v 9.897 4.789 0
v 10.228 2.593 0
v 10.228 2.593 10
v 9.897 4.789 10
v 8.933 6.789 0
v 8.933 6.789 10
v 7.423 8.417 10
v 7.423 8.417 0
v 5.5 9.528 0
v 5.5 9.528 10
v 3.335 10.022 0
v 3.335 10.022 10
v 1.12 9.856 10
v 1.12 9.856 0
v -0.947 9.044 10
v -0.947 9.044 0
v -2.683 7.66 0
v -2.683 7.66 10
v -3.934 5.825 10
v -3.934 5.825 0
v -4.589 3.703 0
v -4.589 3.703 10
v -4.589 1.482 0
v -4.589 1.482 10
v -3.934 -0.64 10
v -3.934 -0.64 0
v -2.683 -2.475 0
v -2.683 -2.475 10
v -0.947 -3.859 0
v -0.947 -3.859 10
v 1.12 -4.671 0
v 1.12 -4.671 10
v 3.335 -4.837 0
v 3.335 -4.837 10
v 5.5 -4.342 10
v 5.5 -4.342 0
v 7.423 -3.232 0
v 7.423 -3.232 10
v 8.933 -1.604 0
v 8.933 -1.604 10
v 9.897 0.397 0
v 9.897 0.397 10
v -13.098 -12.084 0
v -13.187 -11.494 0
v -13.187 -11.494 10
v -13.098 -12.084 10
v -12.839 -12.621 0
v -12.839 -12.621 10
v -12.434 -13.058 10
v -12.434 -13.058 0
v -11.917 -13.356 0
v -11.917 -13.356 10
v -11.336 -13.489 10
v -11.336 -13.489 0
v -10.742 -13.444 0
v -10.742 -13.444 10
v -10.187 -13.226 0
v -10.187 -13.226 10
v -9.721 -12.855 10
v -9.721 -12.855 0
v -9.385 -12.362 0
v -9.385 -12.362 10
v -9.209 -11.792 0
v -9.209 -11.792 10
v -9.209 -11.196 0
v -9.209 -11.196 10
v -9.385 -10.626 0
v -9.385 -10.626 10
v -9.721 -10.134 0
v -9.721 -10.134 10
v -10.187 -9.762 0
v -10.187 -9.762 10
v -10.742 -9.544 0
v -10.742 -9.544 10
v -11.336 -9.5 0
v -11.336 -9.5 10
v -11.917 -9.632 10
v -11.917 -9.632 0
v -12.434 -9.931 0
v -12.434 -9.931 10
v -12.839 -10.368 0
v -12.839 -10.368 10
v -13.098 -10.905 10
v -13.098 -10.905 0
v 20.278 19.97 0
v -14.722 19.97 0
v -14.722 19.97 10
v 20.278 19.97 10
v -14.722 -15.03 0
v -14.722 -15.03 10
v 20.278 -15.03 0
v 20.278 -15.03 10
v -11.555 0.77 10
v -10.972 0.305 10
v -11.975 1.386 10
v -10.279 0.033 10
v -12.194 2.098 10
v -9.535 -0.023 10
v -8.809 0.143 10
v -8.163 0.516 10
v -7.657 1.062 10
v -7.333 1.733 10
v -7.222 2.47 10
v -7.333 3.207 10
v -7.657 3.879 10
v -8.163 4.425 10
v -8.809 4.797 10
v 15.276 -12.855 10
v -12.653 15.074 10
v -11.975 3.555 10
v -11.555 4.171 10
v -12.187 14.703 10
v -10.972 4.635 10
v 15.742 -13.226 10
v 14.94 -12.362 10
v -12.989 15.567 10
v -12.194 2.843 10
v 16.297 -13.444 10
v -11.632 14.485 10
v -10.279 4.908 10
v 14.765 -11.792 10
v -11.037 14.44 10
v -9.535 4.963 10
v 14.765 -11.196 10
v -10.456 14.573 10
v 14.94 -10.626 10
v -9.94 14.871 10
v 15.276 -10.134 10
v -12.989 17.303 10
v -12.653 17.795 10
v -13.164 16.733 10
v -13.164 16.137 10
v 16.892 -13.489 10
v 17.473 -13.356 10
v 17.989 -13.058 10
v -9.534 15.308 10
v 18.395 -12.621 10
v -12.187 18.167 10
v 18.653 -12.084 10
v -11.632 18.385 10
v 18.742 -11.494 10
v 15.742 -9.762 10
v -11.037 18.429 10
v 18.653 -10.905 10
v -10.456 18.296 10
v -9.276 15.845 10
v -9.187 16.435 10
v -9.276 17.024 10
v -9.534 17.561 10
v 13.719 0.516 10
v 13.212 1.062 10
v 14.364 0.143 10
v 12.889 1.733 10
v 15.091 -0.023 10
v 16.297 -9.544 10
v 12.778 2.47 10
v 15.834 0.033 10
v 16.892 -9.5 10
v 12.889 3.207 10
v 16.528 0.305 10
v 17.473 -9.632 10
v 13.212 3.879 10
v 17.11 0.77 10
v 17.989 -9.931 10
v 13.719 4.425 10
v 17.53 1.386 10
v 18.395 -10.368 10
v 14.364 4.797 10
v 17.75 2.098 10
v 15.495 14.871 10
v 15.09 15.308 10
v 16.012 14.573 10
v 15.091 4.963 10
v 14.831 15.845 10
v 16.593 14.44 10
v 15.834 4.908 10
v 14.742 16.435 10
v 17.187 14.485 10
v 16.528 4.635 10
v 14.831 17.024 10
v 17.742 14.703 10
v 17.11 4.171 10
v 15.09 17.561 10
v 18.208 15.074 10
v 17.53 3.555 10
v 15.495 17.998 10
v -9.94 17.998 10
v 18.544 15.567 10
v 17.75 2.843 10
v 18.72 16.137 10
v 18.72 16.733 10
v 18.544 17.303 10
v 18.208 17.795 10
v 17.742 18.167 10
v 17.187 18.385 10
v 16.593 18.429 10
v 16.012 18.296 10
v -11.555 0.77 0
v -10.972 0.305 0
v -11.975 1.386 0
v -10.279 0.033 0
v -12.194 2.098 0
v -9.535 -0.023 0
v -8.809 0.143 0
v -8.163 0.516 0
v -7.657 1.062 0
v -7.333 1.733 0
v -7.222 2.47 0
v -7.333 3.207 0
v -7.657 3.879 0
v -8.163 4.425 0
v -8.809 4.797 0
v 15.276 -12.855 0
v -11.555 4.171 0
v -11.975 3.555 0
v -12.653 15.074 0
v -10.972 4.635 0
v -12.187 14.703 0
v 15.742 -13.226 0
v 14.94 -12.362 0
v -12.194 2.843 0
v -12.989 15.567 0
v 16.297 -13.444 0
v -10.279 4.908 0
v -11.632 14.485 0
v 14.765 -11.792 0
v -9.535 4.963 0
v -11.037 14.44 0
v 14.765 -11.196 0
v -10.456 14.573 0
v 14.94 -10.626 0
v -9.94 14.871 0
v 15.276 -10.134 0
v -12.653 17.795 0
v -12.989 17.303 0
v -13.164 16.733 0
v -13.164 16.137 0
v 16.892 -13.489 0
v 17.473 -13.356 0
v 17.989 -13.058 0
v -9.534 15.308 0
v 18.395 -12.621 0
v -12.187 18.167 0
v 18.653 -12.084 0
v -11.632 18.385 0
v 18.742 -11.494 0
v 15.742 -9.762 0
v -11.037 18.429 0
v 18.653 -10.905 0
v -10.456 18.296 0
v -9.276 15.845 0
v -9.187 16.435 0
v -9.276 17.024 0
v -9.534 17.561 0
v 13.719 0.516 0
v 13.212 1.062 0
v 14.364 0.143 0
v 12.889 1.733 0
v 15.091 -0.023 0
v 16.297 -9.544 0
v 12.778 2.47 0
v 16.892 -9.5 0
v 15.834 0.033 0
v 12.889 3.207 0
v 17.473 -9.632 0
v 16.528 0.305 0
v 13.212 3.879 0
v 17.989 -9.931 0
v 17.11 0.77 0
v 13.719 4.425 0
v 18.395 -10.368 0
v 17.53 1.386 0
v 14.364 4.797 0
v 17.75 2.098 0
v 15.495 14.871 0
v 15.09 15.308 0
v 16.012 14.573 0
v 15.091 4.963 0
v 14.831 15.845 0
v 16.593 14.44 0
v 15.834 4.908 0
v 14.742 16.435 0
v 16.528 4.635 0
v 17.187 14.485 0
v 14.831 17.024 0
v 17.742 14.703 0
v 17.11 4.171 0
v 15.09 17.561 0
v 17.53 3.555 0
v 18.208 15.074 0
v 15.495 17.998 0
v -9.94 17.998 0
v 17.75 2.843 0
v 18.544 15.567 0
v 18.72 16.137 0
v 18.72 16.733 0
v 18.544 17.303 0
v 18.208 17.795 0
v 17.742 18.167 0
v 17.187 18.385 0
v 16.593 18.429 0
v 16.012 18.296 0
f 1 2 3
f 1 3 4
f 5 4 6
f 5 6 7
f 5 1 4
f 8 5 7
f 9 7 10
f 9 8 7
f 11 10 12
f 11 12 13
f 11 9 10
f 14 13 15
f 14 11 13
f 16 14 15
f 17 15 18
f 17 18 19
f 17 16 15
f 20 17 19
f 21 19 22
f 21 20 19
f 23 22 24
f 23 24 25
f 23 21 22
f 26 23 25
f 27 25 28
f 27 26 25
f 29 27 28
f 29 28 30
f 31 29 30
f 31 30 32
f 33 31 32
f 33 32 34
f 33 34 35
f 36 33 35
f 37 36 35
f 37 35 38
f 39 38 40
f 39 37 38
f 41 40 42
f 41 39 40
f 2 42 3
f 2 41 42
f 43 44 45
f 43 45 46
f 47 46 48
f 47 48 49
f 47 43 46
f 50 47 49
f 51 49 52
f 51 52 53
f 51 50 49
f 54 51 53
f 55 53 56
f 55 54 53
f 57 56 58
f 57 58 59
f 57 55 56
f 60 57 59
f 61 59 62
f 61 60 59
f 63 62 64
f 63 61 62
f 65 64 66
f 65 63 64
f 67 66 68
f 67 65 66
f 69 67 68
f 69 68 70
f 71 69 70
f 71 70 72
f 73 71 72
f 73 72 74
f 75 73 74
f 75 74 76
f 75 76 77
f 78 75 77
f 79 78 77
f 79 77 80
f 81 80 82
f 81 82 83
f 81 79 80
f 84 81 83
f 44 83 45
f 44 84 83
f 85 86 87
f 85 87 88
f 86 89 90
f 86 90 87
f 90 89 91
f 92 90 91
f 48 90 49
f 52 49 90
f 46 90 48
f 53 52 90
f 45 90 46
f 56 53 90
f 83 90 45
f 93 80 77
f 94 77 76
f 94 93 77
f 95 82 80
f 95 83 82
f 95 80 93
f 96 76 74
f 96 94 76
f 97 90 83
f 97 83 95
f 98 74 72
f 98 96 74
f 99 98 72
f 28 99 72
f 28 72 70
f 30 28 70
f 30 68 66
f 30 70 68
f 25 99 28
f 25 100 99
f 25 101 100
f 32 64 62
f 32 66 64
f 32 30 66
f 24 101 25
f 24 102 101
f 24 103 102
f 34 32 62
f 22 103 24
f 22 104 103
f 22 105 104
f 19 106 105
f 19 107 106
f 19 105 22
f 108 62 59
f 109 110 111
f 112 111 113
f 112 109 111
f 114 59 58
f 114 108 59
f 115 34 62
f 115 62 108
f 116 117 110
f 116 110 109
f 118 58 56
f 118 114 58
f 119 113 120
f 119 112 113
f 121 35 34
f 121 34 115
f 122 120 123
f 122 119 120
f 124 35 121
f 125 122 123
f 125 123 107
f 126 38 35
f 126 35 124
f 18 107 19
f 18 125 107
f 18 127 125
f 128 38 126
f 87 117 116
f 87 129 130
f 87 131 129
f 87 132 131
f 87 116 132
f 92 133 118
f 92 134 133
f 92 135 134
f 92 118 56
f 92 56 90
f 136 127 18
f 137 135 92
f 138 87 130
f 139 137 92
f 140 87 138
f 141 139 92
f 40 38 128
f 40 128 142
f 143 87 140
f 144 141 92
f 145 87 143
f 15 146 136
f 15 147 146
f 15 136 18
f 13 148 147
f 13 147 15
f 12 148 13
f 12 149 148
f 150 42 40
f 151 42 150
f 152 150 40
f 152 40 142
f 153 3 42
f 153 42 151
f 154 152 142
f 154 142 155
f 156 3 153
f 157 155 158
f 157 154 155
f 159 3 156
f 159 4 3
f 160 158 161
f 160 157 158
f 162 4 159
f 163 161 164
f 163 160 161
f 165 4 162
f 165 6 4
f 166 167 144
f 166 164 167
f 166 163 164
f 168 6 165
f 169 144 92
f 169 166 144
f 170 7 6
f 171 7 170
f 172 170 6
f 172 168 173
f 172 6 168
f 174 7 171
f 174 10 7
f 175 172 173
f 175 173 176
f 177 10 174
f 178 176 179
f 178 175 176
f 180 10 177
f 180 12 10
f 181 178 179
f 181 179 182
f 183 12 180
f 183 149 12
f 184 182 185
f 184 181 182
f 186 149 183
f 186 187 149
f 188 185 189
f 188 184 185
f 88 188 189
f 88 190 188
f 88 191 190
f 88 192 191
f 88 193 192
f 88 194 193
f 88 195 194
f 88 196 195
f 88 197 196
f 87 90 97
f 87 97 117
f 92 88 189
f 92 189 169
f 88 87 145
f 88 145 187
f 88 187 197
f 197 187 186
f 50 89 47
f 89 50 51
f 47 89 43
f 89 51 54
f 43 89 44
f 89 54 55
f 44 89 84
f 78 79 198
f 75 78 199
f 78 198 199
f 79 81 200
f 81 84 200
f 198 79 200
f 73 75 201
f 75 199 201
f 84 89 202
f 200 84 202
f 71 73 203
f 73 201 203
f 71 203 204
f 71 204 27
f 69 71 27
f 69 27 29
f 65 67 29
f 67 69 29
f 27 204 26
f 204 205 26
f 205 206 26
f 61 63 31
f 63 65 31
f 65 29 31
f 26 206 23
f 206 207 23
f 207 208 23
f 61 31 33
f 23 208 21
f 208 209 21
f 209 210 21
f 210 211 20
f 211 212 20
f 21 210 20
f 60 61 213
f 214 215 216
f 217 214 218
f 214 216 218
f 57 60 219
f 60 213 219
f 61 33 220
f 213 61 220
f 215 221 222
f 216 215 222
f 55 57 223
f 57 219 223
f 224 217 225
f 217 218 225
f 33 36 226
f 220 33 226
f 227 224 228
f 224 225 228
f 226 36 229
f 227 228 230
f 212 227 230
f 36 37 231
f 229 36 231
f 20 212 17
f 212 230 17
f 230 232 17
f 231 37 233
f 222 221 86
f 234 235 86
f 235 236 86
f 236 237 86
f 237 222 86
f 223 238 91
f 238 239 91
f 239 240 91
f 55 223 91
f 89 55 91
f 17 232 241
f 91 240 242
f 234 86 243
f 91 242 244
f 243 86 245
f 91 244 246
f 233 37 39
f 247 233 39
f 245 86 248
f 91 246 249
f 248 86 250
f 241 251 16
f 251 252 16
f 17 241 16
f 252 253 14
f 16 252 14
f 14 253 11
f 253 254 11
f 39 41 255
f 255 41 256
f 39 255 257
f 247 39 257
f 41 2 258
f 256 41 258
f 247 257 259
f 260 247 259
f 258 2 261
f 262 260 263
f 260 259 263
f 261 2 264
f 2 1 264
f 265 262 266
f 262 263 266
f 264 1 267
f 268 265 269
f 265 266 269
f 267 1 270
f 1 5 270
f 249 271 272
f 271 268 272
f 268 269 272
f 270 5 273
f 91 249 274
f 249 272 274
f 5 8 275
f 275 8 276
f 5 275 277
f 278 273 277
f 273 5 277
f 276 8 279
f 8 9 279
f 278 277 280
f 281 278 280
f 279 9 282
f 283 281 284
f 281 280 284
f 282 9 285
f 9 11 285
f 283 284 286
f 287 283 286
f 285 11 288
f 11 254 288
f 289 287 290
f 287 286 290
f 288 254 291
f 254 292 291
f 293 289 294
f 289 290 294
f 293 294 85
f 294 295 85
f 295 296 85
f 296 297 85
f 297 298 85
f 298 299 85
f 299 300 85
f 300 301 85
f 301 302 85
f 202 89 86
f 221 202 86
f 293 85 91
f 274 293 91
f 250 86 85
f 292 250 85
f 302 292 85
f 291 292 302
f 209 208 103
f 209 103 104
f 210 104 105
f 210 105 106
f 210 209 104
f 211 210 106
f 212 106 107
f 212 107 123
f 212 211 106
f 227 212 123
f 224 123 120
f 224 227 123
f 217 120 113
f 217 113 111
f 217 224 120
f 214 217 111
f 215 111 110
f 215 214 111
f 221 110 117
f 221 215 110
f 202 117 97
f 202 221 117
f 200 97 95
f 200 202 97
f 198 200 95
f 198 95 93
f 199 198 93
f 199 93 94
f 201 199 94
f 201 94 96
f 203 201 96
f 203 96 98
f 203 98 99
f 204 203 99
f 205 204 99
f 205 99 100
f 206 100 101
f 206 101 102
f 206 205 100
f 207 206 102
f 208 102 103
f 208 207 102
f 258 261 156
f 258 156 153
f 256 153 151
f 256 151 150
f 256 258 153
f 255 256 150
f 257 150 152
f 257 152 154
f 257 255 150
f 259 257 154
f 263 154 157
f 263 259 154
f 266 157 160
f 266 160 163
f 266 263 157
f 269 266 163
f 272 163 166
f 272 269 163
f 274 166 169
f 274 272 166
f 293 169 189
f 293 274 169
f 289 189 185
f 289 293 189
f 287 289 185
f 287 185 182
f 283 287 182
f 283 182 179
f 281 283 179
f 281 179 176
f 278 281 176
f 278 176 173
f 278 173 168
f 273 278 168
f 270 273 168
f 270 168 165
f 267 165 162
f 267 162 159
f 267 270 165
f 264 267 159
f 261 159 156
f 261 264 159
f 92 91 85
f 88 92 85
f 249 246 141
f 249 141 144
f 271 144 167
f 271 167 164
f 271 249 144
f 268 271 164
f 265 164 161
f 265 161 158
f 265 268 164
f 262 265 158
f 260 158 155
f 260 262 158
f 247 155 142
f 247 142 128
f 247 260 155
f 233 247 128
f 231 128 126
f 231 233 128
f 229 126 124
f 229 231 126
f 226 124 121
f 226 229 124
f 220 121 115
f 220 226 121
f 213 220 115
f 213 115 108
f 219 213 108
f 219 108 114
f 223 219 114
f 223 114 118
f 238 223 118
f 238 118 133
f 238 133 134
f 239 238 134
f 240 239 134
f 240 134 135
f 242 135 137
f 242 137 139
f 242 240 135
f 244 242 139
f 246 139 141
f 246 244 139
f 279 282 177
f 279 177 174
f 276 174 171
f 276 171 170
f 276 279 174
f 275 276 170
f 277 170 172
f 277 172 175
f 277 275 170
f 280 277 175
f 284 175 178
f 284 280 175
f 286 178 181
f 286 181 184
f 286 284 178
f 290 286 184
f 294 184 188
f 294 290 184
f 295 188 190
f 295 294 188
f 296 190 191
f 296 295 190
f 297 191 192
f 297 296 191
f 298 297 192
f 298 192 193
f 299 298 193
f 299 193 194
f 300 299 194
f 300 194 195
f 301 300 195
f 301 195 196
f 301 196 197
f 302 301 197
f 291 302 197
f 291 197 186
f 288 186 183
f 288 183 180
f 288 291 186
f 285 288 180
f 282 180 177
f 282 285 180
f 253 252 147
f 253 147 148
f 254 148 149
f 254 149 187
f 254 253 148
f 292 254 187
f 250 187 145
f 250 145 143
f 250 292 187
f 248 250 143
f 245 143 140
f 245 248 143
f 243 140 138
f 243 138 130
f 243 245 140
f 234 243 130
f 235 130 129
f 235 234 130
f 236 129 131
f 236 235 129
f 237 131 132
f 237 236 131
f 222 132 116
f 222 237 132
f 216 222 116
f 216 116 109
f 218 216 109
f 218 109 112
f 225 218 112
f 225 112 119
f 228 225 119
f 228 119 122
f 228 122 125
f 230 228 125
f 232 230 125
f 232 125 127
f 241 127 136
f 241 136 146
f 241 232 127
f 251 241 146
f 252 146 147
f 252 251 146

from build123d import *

# Parameters (mm, degrees)
SKETCH1_W           = 35
SKETCH1_H           = 35
SKETCH1_R           = 7.45
SKETCH1_R_2         = 2
SKETCH1_R_3         = 2.5
BOSS_EXTRUDE1_DEPTH = 10


with BuildPart() as part:
    # Sketch1 → Boss-Extrude1 (new body)
    with BuildSketch(Plane.XY):
        with Locations((2.777777778, 2.470273614)):
            Rectangle(SKETCH1_W, SKETCH1_H)
        with Locations((2.777777778, 2.592592593)):
            Circle(SKETCH1_R, mode=Mode.SUBTRACT)
        with Locations((16.742243872, -11.49419248)):
            Circle(SKETCH1_R_2, mode=Mode.SUBTRACT)
        with Locations(Location((16.742243872, 16.434739708, 0), (0, 0, 180))):
            Circle(SKETCH1_R_2, mode=Mode.SUBTRACT)
        with Locations((-11.186688316, 16.434739708)):
            Circle(SKETCH1_R_2, mode=Mode.SUBTRACT)
        with Locations(Location((-11.186688316, -11.49419248, 0), (0, 0, 180))):
            Circle(SKETCH1_R_2, mode=Mode.SUBTRACT)
        with Locations(Location((15.277777778, 2.470273614, 0), (0, 0, 180))):
            Circle(SKETCH1_R_3, mode=Mode.SUBTRACT)
        with Locations((-9.722222222, 2.470273614)):
            Circle(SKETCH1_R_3, mode=Mode.SUBTRACT)
    extrude(amount=BOSS_EXTRUDE1_DEPTH)


solid = part.part
